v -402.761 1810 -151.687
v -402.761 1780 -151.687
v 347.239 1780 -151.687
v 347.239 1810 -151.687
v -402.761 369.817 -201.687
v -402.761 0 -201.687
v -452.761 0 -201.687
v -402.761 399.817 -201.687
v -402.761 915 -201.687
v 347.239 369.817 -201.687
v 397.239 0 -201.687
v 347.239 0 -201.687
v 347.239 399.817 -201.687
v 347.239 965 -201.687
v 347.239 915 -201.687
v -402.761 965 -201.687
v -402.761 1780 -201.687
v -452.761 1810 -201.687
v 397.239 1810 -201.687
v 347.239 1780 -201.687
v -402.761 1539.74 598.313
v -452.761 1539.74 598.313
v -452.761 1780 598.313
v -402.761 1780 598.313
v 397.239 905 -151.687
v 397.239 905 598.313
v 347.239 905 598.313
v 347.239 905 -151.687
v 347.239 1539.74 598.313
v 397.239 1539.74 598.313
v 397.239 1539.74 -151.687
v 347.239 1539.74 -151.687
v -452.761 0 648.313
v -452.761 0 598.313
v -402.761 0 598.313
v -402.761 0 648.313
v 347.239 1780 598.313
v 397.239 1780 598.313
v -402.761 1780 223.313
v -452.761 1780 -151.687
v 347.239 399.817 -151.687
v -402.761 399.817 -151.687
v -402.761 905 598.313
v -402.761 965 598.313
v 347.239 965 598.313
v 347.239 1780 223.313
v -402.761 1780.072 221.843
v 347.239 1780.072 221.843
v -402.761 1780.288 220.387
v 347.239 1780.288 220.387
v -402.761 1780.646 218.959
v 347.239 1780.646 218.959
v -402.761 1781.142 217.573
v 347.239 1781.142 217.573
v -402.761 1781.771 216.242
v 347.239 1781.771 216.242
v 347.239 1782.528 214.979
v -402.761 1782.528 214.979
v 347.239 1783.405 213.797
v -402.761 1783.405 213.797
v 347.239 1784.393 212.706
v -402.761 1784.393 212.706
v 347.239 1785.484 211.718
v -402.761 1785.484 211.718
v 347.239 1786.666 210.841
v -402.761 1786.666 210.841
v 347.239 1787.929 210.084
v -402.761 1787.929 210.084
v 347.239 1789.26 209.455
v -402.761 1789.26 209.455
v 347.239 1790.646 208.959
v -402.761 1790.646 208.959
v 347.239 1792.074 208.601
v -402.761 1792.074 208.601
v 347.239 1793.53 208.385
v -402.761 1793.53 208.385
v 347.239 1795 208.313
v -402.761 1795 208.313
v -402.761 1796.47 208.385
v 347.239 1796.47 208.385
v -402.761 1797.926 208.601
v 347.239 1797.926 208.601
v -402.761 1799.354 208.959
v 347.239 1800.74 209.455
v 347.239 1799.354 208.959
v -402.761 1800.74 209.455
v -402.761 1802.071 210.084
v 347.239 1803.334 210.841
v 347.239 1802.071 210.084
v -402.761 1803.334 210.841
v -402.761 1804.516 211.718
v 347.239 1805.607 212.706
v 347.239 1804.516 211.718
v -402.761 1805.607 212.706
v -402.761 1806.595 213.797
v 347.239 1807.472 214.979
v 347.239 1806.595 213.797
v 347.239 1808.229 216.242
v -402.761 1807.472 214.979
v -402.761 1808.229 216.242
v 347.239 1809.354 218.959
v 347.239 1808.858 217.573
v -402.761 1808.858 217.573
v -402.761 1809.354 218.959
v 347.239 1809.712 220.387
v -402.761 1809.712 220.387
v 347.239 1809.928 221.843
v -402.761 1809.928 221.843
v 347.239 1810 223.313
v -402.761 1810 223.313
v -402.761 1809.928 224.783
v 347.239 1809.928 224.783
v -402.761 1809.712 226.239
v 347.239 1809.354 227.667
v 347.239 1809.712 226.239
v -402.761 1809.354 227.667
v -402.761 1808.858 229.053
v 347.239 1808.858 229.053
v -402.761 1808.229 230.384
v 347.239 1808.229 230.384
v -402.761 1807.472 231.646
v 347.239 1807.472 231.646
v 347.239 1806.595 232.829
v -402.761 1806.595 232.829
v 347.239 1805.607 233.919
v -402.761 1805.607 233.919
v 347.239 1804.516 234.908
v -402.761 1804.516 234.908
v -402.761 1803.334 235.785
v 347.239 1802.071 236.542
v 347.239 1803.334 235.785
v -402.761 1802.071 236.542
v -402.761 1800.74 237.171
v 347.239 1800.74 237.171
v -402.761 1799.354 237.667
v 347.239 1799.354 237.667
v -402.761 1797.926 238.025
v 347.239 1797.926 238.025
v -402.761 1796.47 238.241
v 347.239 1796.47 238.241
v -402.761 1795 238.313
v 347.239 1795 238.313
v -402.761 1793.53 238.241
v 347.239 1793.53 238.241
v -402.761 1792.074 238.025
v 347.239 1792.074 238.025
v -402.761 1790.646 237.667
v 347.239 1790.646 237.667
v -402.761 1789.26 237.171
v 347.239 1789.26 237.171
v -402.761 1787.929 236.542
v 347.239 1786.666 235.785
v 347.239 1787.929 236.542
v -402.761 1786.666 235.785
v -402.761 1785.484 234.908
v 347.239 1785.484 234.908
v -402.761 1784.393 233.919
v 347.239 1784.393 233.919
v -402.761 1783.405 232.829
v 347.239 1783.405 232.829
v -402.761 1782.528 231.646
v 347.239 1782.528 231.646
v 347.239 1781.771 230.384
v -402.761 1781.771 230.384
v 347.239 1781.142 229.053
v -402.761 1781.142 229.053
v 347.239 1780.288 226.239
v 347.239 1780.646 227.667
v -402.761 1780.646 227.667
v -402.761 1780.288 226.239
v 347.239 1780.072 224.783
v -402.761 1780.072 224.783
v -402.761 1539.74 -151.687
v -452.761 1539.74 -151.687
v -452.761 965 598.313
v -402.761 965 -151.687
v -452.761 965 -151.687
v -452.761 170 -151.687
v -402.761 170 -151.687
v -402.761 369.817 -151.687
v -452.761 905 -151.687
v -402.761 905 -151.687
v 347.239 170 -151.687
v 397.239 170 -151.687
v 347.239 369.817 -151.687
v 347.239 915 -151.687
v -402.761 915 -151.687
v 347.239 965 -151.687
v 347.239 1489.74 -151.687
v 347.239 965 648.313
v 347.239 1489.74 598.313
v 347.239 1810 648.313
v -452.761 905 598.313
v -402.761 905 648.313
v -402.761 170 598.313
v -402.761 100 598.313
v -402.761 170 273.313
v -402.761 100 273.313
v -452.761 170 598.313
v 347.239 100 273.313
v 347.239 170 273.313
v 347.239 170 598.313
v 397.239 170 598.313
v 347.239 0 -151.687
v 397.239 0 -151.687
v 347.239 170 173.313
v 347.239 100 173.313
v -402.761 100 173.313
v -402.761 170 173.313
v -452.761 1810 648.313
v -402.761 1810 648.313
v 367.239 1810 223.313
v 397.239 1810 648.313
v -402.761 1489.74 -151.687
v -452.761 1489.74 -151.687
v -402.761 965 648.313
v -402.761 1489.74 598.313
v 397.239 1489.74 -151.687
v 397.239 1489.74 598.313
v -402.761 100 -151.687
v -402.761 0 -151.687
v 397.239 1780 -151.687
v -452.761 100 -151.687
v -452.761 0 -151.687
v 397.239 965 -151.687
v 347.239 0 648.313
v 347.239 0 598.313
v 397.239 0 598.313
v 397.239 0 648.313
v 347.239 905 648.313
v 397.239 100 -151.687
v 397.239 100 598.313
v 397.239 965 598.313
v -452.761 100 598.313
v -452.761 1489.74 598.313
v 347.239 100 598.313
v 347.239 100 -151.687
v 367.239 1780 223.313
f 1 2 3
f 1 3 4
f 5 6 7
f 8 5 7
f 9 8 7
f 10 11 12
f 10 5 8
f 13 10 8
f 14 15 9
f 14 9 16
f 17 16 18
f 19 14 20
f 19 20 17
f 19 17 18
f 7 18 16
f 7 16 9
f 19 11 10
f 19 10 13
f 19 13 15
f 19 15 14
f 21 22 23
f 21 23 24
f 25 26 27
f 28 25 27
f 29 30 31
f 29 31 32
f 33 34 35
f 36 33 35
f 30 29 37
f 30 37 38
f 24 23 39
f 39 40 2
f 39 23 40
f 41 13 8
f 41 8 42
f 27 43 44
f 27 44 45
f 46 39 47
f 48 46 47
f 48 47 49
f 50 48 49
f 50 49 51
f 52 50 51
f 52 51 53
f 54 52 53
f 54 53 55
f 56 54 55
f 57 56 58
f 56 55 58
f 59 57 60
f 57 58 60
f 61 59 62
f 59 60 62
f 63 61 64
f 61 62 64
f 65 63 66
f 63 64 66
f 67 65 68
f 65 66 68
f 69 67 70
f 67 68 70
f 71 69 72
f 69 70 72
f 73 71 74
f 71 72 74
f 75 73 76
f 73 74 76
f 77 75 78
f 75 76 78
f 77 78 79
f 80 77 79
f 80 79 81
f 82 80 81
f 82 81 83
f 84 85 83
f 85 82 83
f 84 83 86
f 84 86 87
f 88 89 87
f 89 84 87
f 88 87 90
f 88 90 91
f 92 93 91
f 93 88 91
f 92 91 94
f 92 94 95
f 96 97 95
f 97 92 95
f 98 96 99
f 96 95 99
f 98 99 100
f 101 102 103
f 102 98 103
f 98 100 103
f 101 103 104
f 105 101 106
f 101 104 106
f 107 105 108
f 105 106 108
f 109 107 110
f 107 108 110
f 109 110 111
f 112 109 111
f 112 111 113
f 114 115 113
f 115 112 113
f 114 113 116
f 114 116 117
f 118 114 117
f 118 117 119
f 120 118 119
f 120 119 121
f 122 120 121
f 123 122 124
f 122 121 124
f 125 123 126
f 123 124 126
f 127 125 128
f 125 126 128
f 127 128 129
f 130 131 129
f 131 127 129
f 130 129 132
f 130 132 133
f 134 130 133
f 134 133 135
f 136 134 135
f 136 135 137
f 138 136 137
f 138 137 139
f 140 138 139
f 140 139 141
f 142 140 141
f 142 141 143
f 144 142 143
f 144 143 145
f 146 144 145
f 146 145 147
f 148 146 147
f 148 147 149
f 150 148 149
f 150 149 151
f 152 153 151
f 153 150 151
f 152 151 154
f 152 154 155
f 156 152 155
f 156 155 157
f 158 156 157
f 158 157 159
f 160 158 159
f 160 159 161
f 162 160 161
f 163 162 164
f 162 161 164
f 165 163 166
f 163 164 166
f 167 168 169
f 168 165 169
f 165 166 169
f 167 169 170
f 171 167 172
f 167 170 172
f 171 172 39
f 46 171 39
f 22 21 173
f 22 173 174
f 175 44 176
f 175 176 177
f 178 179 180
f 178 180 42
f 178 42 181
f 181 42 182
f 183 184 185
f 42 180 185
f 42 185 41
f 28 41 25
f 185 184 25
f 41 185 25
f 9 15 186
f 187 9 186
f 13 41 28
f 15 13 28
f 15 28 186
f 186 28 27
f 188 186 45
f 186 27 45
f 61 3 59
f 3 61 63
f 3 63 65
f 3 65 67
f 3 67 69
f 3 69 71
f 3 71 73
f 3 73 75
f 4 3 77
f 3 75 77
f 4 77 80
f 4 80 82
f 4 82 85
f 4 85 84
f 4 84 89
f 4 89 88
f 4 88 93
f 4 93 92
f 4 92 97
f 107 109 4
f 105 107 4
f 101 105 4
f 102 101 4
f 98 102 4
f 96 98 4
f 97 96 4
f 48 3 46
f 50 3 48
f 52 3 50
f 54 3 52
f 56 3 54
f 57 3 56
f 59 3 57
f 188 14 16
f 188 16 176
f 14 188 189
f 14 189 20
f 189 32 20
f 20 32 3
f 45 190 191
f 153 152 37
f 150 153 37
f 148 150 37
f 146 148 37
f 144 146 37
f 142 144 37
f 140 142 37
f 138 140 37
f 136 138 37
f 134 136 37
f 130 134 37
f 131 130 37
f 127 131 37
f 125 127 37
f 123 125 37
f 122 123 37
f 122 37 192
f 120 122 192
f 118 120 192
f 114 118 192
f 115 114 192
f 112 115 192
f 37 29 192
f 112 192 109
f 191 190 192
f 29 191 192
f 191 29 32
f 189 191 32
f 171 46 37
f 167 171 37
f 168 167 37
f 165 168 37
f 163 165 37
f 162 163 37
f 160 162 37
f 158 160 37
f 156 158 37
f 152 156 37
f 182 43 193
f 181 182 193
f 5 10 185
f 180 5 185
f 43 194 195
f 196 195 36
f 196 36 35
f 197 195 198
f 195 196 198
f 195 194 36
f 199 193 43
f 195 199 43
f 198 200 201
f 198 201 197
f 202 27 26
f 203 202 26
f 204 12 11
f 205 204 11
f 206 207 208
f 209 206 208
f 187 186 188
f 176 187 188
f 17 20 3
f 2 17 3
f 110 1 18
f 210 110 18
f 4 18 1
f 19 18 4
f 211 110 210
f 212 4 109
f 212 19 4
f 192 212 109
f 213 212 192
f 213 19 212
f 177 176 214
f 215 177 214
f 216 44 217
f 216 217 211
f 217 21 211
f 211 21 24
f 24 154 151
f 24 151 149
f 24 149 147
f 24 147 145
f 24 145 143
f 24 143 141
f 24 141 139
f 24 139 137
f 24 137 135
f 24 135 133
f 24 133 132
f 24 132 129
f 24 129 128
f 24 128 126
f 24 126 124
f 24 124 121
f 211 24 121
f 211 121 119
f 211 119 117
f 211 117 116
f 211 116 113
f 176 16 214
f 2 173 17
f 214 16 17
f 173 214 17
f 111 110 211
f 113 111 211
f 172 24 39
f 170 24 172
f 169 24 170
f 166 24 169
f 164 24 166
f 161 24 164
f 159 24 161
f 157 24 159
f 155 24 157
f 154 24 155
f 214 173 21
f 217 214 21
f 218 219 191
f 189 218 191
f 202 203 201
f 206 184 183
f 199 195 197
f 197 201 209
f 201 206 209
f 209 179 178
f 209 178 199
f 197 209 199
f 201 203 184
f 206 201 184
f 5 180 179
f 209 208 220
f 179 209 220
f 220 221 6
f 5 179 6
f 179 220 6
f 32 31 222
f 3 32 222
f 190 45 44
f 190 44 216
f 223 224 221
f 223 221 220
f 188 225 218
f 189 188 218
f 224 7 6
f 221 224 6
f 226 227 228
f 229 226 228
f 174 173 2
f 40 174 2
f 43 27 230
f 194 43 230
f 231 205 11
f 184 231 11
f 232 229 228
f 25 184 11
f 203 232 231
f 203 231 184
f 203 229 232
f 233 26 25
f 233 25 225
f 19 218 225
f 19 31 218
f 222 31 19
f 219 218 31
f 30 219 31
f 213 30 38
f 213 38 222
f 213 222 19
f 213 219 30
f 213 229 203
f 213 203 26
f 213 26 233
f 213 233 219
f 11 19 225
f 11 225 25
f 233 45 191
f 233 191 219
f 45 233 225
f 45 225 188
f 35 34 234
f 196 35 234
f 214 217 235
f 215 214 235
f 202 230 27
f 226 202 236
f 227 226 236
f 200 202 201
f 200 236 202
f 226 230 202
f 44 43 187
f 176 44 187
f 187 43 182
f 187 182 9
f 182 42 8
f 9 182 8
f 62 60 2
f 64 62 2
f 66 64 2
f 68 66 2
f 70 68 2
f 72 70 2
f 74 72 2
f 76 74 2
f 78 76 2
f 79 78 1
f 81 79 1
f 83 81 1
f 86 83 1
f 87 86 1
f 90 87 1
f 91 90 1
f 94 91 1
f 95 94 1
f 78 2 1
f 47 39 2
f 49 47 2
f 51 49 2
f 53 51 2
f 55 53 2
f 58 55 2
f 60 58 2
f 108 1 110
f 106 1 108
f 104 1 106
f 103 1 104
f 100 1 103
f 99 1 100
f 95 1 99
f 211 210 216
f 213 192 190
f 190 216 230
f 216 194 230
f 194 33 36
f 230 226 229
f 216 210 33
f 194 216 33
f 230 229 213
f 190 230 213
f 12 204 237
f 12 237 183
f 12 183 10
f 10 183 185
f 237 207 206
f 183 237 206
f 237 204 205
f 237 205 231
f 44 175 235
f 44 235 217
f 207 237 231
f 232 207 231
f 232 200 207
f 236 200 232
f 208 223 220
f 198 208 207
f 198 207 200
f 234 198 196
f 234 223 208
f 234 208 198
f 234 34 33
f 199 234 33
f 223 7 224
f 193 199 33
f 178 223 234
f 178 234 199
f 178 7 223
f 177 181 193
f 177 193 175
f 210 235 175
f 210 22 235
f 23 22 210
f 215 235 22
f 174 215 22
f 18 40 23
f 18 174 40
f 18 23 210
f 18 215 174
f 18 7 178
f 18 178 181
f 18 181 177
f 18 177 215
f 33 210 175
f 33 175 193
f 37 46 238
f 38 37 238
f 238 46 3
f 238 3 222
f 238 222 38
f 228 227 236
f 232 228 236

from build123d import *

# Parameters (mm, degrees)
SKETCH1_W             = 50
SKETCH1_H             = 50
BOSS_EXTRUDE1_DEPTH   = 1810
BOSS_EXTRUDE1_2_DEPTH = 1810
BOSS_EXTRUDE1_3_DEPTH = 1810
BOSS_EXTRUDE1_4_DEPTH = 1810
BOSS_EXTRUDE2_START   = 10
SKETCH2_W             = 50
SKETCH2_H             = 750
SKETCH2_W_2           = 750
SKETCH2_H_2           = 100
BOSS_EXTRUDE2_DEPTH   = 180
SKETCH4_W             = 750
SKETCH4_H             = 110
CUT_EXTRUDE4_DEPTH    = 1050
SKETCH5_W             = 50
SKETCH5_H             = 50
SKETCH5_H_2           = 60
BOSS_EXTRUDE3_DEPTH   = 770
SKETCH6_W             = 50
SKETCH6_H             = 60
BOSS_EXTRUDE4_DEPTH   = 770
SKETCH8_W             = 50
SKETCH8_H             = 50
BOSS_EXTRUDE5_DEPTH   = 770
SKETCH9_W             = 50
SKETCH9_H             = 30
BOSS_EXTRUDE6_DEPTH   = 770
SKETCH10_R            = 15
BOSS_EXTRUDE7_DEPTH   = 770
SKETCH11_W            = 50
SKETCH11_H            = 30
BOSS_EXTRUDE8_DEPTH   = 770
SKETCH12_W            = 50
SKETCH12_H            = 30
BOSS_EXTRUDE9_DEPTH   = 770


with BuildPart() as part:
    # Sketch1 → Boss-Extrude1 (new body)
    with BuildSketch(Plane(origin=(0, 0, 0), x_dir=(1, 0, 0), z_dir=(0, 1, 0))):
        with Locations((-427.760736196, -623.312883436)):
            Rectangle(SKETCH1_W, SKETCH1_H)
    extrude(amount=BOSS_EXTRUDE1_DEPTH)



with BuildPart() as body_2:
    # Sketch1 → Boss-Extrude1 2 (new body)
    with BuildSketch(Plane(origin=(0, 0, 0), x_dir=(1, 0, 0), z_dir=(0, 1, 0))):
        with Locations((372.239263804, -623.312883436)):
            Rectangle(SKETCH1_W, SKETCH1_H)
    extrude(amount=BOSS_EXTRUDE1_2_DEPTH)


with BuildPart() as body_3:
    # Sketch1 → Boss-Extrude1 3 (new body)
    with BuildSketch(Plane(origin=(0, 0, 0), x_dir=(1, 0, 0), z_dir=(0, 1, 0))):
        with Locations((372.239263804, 176.687116564)):
            Rectangle(SKETCH1_W, SKETCH1_H)
    extrude(amount=BOSS_EXTRUDE1_3_DEPTH)


with BuildPart() as body_4:
    # Sketch1 → Boss-Extrude1 4 (new body)
    with BuildSketch(Plane(origin=(0, 0, 0), x_dir=(1, 0, 0), z_dir=(0, 1, 0))):
        with Locations((-427.760736196, 176.687116564)):
            Rectangle(SKETCH1_W, SKETCH1_H)
    extrude(amount=BOSS_EXTRUDE1_4_DEPTH)


with BuildPart() as part_1:
    add(part.part)

    add(body_2.part)  # Boss-Extrude2 merges body 2

    add(body_3.part)  # Boss-Extrude2 merges body 3

    add(body_4.part)  # Boss-Extrude2 merges body 4
    # Sketch2 → Boss-Extrude2 (add)
    with BuildSketch(Plane(origin=(0, 0, 0), x_dir=(-1, 0, 0), z_dir=(0, -1, 0)).offset(BOSS_EXTRUDE2_START)):
        with Locations((427.760736196, -223.312883436)):
            Rectangle(SKETCH2_W, SKETCH2_H)
        with Locations((27.760736196, -223.312883436)):
            Rectangle(SKETCH2_W_2, SKETCH2_H_2)
        with Locations((-372.239263804, -223.312883436)):
            Rectangle(SKETCH2_W, SKETCH2_H)
    extrude(amount=-BOSS_EXTRUDE2_DEPTH)

    # Sketch4 → Cut-Extrude4 (cut)
    with BuildSketch(Plane.ZY.offset(452.760736196)):
        with Locations((223.312883436, 45)):
            Rectangle(SKETCH4_W, SKETCH4_H)
    extrude(amount=-CUT_EXTRUDE4_DEPTH, mode=Mode.SUBTRACT)

    # Sketch5 → Boss-Extrude3 (add)
    with BuildSketch(Plane.ZY.offset(-347.239263804)):
        with Locations((-176.687116564, 940)):
            Rectangle(SKETCH5_W, SKETCH5_H)
        with Locations((623.312883436, 935)):
            Rectangle(SKETCH5_W, SKETCH5_H_2)
    extrude(amount=BOSS_EXTRUDE3_DEPTH)

    # Sketch6 → Boss-Extrude4 (add)
    with BuildSketch(Plane(origin=(0, 0, 598.312883436), x_dir=(-1, 0, 0), z_dir=(0, 0, -1))):
        with Locations((-372.239263804, 935)):
            Rectangle(SKETCH6_W, SKETCH6_H)
        with Locations((427.760736196, 935)):
            Rectangle(SKETCH6_W, SKETCH6_H)
    extrude(amount=BOSS_EXTRUDE4_DEPTH)

    # Sketch8 → Boss-Extrude5 (add)
    with BuildSketch(Plane(origin=(0, 0, 598.312883436), x_dir=(-1, 0, 0), z_dir=(0, 0, -1))):
        with Locations((-372.239263804, 1514.740067664)):
            Rectangle(SKETCH8_W, SKETCH8_H)
        with Locations((427.760736196, 1514.740067664)):
            Rectangle(SKETCH8_W, SKETCH8_H)
    extrude(amount=BOSS_EXTRUDE5_DEPTH)

    # Sketch9 → Boss-Extrude6 (add)
    with BuildSketch(Plane.XY.offset(-151.687116564)):
        with Locations((-427.760736196, 1795)):
            Rectangle(SKETCH9_W, SKETCH9_H)
        with Locations((372.239263804, 1795)):
            Rectangle(SKETCH9_W, SKETCH9_H)
    extrude(amount=BOSS_EXTRUDE6_DEPTH)

    # Sketch10 → Boss-Extrude7 (add)
    with BuildSketch(Plane(origin=(-402.760736196, 0, 0), x_dir=(0, 0, -1), z_dir=(1, 0, 0))):
        with Locations(Location((-223.312883436, 1795, 0), (0, 0, 270))):
            Circle(SKETCH10_R)
    extrude(amount=BOSS_EXTRUDE7_DEPTH)

    # Sketch11 → Boss-Extrude8 (add)
    with BuildSketch(Plane.ZY.offset(-347.239263804)):
        with Locations((-176.687116564, 1795)):
            Rectangle(SKETCH11_W, SKETCH11_H)
    extrude(amount=BOSS_EXTRUDE8_DEPTH)

    # Sketch12 → Boss-Extrude9 (add)
    with BuildSketch(Plane.ZY.offset(-347.239263804)):
        with Locations((-176.687116564, 384.816862376)):
            Rectangle(SKETCH12_W, SKETCH12_H)
    extrude(amount=BOSS_EXTRUDE9_DEPTH)


solid = part_1.part
